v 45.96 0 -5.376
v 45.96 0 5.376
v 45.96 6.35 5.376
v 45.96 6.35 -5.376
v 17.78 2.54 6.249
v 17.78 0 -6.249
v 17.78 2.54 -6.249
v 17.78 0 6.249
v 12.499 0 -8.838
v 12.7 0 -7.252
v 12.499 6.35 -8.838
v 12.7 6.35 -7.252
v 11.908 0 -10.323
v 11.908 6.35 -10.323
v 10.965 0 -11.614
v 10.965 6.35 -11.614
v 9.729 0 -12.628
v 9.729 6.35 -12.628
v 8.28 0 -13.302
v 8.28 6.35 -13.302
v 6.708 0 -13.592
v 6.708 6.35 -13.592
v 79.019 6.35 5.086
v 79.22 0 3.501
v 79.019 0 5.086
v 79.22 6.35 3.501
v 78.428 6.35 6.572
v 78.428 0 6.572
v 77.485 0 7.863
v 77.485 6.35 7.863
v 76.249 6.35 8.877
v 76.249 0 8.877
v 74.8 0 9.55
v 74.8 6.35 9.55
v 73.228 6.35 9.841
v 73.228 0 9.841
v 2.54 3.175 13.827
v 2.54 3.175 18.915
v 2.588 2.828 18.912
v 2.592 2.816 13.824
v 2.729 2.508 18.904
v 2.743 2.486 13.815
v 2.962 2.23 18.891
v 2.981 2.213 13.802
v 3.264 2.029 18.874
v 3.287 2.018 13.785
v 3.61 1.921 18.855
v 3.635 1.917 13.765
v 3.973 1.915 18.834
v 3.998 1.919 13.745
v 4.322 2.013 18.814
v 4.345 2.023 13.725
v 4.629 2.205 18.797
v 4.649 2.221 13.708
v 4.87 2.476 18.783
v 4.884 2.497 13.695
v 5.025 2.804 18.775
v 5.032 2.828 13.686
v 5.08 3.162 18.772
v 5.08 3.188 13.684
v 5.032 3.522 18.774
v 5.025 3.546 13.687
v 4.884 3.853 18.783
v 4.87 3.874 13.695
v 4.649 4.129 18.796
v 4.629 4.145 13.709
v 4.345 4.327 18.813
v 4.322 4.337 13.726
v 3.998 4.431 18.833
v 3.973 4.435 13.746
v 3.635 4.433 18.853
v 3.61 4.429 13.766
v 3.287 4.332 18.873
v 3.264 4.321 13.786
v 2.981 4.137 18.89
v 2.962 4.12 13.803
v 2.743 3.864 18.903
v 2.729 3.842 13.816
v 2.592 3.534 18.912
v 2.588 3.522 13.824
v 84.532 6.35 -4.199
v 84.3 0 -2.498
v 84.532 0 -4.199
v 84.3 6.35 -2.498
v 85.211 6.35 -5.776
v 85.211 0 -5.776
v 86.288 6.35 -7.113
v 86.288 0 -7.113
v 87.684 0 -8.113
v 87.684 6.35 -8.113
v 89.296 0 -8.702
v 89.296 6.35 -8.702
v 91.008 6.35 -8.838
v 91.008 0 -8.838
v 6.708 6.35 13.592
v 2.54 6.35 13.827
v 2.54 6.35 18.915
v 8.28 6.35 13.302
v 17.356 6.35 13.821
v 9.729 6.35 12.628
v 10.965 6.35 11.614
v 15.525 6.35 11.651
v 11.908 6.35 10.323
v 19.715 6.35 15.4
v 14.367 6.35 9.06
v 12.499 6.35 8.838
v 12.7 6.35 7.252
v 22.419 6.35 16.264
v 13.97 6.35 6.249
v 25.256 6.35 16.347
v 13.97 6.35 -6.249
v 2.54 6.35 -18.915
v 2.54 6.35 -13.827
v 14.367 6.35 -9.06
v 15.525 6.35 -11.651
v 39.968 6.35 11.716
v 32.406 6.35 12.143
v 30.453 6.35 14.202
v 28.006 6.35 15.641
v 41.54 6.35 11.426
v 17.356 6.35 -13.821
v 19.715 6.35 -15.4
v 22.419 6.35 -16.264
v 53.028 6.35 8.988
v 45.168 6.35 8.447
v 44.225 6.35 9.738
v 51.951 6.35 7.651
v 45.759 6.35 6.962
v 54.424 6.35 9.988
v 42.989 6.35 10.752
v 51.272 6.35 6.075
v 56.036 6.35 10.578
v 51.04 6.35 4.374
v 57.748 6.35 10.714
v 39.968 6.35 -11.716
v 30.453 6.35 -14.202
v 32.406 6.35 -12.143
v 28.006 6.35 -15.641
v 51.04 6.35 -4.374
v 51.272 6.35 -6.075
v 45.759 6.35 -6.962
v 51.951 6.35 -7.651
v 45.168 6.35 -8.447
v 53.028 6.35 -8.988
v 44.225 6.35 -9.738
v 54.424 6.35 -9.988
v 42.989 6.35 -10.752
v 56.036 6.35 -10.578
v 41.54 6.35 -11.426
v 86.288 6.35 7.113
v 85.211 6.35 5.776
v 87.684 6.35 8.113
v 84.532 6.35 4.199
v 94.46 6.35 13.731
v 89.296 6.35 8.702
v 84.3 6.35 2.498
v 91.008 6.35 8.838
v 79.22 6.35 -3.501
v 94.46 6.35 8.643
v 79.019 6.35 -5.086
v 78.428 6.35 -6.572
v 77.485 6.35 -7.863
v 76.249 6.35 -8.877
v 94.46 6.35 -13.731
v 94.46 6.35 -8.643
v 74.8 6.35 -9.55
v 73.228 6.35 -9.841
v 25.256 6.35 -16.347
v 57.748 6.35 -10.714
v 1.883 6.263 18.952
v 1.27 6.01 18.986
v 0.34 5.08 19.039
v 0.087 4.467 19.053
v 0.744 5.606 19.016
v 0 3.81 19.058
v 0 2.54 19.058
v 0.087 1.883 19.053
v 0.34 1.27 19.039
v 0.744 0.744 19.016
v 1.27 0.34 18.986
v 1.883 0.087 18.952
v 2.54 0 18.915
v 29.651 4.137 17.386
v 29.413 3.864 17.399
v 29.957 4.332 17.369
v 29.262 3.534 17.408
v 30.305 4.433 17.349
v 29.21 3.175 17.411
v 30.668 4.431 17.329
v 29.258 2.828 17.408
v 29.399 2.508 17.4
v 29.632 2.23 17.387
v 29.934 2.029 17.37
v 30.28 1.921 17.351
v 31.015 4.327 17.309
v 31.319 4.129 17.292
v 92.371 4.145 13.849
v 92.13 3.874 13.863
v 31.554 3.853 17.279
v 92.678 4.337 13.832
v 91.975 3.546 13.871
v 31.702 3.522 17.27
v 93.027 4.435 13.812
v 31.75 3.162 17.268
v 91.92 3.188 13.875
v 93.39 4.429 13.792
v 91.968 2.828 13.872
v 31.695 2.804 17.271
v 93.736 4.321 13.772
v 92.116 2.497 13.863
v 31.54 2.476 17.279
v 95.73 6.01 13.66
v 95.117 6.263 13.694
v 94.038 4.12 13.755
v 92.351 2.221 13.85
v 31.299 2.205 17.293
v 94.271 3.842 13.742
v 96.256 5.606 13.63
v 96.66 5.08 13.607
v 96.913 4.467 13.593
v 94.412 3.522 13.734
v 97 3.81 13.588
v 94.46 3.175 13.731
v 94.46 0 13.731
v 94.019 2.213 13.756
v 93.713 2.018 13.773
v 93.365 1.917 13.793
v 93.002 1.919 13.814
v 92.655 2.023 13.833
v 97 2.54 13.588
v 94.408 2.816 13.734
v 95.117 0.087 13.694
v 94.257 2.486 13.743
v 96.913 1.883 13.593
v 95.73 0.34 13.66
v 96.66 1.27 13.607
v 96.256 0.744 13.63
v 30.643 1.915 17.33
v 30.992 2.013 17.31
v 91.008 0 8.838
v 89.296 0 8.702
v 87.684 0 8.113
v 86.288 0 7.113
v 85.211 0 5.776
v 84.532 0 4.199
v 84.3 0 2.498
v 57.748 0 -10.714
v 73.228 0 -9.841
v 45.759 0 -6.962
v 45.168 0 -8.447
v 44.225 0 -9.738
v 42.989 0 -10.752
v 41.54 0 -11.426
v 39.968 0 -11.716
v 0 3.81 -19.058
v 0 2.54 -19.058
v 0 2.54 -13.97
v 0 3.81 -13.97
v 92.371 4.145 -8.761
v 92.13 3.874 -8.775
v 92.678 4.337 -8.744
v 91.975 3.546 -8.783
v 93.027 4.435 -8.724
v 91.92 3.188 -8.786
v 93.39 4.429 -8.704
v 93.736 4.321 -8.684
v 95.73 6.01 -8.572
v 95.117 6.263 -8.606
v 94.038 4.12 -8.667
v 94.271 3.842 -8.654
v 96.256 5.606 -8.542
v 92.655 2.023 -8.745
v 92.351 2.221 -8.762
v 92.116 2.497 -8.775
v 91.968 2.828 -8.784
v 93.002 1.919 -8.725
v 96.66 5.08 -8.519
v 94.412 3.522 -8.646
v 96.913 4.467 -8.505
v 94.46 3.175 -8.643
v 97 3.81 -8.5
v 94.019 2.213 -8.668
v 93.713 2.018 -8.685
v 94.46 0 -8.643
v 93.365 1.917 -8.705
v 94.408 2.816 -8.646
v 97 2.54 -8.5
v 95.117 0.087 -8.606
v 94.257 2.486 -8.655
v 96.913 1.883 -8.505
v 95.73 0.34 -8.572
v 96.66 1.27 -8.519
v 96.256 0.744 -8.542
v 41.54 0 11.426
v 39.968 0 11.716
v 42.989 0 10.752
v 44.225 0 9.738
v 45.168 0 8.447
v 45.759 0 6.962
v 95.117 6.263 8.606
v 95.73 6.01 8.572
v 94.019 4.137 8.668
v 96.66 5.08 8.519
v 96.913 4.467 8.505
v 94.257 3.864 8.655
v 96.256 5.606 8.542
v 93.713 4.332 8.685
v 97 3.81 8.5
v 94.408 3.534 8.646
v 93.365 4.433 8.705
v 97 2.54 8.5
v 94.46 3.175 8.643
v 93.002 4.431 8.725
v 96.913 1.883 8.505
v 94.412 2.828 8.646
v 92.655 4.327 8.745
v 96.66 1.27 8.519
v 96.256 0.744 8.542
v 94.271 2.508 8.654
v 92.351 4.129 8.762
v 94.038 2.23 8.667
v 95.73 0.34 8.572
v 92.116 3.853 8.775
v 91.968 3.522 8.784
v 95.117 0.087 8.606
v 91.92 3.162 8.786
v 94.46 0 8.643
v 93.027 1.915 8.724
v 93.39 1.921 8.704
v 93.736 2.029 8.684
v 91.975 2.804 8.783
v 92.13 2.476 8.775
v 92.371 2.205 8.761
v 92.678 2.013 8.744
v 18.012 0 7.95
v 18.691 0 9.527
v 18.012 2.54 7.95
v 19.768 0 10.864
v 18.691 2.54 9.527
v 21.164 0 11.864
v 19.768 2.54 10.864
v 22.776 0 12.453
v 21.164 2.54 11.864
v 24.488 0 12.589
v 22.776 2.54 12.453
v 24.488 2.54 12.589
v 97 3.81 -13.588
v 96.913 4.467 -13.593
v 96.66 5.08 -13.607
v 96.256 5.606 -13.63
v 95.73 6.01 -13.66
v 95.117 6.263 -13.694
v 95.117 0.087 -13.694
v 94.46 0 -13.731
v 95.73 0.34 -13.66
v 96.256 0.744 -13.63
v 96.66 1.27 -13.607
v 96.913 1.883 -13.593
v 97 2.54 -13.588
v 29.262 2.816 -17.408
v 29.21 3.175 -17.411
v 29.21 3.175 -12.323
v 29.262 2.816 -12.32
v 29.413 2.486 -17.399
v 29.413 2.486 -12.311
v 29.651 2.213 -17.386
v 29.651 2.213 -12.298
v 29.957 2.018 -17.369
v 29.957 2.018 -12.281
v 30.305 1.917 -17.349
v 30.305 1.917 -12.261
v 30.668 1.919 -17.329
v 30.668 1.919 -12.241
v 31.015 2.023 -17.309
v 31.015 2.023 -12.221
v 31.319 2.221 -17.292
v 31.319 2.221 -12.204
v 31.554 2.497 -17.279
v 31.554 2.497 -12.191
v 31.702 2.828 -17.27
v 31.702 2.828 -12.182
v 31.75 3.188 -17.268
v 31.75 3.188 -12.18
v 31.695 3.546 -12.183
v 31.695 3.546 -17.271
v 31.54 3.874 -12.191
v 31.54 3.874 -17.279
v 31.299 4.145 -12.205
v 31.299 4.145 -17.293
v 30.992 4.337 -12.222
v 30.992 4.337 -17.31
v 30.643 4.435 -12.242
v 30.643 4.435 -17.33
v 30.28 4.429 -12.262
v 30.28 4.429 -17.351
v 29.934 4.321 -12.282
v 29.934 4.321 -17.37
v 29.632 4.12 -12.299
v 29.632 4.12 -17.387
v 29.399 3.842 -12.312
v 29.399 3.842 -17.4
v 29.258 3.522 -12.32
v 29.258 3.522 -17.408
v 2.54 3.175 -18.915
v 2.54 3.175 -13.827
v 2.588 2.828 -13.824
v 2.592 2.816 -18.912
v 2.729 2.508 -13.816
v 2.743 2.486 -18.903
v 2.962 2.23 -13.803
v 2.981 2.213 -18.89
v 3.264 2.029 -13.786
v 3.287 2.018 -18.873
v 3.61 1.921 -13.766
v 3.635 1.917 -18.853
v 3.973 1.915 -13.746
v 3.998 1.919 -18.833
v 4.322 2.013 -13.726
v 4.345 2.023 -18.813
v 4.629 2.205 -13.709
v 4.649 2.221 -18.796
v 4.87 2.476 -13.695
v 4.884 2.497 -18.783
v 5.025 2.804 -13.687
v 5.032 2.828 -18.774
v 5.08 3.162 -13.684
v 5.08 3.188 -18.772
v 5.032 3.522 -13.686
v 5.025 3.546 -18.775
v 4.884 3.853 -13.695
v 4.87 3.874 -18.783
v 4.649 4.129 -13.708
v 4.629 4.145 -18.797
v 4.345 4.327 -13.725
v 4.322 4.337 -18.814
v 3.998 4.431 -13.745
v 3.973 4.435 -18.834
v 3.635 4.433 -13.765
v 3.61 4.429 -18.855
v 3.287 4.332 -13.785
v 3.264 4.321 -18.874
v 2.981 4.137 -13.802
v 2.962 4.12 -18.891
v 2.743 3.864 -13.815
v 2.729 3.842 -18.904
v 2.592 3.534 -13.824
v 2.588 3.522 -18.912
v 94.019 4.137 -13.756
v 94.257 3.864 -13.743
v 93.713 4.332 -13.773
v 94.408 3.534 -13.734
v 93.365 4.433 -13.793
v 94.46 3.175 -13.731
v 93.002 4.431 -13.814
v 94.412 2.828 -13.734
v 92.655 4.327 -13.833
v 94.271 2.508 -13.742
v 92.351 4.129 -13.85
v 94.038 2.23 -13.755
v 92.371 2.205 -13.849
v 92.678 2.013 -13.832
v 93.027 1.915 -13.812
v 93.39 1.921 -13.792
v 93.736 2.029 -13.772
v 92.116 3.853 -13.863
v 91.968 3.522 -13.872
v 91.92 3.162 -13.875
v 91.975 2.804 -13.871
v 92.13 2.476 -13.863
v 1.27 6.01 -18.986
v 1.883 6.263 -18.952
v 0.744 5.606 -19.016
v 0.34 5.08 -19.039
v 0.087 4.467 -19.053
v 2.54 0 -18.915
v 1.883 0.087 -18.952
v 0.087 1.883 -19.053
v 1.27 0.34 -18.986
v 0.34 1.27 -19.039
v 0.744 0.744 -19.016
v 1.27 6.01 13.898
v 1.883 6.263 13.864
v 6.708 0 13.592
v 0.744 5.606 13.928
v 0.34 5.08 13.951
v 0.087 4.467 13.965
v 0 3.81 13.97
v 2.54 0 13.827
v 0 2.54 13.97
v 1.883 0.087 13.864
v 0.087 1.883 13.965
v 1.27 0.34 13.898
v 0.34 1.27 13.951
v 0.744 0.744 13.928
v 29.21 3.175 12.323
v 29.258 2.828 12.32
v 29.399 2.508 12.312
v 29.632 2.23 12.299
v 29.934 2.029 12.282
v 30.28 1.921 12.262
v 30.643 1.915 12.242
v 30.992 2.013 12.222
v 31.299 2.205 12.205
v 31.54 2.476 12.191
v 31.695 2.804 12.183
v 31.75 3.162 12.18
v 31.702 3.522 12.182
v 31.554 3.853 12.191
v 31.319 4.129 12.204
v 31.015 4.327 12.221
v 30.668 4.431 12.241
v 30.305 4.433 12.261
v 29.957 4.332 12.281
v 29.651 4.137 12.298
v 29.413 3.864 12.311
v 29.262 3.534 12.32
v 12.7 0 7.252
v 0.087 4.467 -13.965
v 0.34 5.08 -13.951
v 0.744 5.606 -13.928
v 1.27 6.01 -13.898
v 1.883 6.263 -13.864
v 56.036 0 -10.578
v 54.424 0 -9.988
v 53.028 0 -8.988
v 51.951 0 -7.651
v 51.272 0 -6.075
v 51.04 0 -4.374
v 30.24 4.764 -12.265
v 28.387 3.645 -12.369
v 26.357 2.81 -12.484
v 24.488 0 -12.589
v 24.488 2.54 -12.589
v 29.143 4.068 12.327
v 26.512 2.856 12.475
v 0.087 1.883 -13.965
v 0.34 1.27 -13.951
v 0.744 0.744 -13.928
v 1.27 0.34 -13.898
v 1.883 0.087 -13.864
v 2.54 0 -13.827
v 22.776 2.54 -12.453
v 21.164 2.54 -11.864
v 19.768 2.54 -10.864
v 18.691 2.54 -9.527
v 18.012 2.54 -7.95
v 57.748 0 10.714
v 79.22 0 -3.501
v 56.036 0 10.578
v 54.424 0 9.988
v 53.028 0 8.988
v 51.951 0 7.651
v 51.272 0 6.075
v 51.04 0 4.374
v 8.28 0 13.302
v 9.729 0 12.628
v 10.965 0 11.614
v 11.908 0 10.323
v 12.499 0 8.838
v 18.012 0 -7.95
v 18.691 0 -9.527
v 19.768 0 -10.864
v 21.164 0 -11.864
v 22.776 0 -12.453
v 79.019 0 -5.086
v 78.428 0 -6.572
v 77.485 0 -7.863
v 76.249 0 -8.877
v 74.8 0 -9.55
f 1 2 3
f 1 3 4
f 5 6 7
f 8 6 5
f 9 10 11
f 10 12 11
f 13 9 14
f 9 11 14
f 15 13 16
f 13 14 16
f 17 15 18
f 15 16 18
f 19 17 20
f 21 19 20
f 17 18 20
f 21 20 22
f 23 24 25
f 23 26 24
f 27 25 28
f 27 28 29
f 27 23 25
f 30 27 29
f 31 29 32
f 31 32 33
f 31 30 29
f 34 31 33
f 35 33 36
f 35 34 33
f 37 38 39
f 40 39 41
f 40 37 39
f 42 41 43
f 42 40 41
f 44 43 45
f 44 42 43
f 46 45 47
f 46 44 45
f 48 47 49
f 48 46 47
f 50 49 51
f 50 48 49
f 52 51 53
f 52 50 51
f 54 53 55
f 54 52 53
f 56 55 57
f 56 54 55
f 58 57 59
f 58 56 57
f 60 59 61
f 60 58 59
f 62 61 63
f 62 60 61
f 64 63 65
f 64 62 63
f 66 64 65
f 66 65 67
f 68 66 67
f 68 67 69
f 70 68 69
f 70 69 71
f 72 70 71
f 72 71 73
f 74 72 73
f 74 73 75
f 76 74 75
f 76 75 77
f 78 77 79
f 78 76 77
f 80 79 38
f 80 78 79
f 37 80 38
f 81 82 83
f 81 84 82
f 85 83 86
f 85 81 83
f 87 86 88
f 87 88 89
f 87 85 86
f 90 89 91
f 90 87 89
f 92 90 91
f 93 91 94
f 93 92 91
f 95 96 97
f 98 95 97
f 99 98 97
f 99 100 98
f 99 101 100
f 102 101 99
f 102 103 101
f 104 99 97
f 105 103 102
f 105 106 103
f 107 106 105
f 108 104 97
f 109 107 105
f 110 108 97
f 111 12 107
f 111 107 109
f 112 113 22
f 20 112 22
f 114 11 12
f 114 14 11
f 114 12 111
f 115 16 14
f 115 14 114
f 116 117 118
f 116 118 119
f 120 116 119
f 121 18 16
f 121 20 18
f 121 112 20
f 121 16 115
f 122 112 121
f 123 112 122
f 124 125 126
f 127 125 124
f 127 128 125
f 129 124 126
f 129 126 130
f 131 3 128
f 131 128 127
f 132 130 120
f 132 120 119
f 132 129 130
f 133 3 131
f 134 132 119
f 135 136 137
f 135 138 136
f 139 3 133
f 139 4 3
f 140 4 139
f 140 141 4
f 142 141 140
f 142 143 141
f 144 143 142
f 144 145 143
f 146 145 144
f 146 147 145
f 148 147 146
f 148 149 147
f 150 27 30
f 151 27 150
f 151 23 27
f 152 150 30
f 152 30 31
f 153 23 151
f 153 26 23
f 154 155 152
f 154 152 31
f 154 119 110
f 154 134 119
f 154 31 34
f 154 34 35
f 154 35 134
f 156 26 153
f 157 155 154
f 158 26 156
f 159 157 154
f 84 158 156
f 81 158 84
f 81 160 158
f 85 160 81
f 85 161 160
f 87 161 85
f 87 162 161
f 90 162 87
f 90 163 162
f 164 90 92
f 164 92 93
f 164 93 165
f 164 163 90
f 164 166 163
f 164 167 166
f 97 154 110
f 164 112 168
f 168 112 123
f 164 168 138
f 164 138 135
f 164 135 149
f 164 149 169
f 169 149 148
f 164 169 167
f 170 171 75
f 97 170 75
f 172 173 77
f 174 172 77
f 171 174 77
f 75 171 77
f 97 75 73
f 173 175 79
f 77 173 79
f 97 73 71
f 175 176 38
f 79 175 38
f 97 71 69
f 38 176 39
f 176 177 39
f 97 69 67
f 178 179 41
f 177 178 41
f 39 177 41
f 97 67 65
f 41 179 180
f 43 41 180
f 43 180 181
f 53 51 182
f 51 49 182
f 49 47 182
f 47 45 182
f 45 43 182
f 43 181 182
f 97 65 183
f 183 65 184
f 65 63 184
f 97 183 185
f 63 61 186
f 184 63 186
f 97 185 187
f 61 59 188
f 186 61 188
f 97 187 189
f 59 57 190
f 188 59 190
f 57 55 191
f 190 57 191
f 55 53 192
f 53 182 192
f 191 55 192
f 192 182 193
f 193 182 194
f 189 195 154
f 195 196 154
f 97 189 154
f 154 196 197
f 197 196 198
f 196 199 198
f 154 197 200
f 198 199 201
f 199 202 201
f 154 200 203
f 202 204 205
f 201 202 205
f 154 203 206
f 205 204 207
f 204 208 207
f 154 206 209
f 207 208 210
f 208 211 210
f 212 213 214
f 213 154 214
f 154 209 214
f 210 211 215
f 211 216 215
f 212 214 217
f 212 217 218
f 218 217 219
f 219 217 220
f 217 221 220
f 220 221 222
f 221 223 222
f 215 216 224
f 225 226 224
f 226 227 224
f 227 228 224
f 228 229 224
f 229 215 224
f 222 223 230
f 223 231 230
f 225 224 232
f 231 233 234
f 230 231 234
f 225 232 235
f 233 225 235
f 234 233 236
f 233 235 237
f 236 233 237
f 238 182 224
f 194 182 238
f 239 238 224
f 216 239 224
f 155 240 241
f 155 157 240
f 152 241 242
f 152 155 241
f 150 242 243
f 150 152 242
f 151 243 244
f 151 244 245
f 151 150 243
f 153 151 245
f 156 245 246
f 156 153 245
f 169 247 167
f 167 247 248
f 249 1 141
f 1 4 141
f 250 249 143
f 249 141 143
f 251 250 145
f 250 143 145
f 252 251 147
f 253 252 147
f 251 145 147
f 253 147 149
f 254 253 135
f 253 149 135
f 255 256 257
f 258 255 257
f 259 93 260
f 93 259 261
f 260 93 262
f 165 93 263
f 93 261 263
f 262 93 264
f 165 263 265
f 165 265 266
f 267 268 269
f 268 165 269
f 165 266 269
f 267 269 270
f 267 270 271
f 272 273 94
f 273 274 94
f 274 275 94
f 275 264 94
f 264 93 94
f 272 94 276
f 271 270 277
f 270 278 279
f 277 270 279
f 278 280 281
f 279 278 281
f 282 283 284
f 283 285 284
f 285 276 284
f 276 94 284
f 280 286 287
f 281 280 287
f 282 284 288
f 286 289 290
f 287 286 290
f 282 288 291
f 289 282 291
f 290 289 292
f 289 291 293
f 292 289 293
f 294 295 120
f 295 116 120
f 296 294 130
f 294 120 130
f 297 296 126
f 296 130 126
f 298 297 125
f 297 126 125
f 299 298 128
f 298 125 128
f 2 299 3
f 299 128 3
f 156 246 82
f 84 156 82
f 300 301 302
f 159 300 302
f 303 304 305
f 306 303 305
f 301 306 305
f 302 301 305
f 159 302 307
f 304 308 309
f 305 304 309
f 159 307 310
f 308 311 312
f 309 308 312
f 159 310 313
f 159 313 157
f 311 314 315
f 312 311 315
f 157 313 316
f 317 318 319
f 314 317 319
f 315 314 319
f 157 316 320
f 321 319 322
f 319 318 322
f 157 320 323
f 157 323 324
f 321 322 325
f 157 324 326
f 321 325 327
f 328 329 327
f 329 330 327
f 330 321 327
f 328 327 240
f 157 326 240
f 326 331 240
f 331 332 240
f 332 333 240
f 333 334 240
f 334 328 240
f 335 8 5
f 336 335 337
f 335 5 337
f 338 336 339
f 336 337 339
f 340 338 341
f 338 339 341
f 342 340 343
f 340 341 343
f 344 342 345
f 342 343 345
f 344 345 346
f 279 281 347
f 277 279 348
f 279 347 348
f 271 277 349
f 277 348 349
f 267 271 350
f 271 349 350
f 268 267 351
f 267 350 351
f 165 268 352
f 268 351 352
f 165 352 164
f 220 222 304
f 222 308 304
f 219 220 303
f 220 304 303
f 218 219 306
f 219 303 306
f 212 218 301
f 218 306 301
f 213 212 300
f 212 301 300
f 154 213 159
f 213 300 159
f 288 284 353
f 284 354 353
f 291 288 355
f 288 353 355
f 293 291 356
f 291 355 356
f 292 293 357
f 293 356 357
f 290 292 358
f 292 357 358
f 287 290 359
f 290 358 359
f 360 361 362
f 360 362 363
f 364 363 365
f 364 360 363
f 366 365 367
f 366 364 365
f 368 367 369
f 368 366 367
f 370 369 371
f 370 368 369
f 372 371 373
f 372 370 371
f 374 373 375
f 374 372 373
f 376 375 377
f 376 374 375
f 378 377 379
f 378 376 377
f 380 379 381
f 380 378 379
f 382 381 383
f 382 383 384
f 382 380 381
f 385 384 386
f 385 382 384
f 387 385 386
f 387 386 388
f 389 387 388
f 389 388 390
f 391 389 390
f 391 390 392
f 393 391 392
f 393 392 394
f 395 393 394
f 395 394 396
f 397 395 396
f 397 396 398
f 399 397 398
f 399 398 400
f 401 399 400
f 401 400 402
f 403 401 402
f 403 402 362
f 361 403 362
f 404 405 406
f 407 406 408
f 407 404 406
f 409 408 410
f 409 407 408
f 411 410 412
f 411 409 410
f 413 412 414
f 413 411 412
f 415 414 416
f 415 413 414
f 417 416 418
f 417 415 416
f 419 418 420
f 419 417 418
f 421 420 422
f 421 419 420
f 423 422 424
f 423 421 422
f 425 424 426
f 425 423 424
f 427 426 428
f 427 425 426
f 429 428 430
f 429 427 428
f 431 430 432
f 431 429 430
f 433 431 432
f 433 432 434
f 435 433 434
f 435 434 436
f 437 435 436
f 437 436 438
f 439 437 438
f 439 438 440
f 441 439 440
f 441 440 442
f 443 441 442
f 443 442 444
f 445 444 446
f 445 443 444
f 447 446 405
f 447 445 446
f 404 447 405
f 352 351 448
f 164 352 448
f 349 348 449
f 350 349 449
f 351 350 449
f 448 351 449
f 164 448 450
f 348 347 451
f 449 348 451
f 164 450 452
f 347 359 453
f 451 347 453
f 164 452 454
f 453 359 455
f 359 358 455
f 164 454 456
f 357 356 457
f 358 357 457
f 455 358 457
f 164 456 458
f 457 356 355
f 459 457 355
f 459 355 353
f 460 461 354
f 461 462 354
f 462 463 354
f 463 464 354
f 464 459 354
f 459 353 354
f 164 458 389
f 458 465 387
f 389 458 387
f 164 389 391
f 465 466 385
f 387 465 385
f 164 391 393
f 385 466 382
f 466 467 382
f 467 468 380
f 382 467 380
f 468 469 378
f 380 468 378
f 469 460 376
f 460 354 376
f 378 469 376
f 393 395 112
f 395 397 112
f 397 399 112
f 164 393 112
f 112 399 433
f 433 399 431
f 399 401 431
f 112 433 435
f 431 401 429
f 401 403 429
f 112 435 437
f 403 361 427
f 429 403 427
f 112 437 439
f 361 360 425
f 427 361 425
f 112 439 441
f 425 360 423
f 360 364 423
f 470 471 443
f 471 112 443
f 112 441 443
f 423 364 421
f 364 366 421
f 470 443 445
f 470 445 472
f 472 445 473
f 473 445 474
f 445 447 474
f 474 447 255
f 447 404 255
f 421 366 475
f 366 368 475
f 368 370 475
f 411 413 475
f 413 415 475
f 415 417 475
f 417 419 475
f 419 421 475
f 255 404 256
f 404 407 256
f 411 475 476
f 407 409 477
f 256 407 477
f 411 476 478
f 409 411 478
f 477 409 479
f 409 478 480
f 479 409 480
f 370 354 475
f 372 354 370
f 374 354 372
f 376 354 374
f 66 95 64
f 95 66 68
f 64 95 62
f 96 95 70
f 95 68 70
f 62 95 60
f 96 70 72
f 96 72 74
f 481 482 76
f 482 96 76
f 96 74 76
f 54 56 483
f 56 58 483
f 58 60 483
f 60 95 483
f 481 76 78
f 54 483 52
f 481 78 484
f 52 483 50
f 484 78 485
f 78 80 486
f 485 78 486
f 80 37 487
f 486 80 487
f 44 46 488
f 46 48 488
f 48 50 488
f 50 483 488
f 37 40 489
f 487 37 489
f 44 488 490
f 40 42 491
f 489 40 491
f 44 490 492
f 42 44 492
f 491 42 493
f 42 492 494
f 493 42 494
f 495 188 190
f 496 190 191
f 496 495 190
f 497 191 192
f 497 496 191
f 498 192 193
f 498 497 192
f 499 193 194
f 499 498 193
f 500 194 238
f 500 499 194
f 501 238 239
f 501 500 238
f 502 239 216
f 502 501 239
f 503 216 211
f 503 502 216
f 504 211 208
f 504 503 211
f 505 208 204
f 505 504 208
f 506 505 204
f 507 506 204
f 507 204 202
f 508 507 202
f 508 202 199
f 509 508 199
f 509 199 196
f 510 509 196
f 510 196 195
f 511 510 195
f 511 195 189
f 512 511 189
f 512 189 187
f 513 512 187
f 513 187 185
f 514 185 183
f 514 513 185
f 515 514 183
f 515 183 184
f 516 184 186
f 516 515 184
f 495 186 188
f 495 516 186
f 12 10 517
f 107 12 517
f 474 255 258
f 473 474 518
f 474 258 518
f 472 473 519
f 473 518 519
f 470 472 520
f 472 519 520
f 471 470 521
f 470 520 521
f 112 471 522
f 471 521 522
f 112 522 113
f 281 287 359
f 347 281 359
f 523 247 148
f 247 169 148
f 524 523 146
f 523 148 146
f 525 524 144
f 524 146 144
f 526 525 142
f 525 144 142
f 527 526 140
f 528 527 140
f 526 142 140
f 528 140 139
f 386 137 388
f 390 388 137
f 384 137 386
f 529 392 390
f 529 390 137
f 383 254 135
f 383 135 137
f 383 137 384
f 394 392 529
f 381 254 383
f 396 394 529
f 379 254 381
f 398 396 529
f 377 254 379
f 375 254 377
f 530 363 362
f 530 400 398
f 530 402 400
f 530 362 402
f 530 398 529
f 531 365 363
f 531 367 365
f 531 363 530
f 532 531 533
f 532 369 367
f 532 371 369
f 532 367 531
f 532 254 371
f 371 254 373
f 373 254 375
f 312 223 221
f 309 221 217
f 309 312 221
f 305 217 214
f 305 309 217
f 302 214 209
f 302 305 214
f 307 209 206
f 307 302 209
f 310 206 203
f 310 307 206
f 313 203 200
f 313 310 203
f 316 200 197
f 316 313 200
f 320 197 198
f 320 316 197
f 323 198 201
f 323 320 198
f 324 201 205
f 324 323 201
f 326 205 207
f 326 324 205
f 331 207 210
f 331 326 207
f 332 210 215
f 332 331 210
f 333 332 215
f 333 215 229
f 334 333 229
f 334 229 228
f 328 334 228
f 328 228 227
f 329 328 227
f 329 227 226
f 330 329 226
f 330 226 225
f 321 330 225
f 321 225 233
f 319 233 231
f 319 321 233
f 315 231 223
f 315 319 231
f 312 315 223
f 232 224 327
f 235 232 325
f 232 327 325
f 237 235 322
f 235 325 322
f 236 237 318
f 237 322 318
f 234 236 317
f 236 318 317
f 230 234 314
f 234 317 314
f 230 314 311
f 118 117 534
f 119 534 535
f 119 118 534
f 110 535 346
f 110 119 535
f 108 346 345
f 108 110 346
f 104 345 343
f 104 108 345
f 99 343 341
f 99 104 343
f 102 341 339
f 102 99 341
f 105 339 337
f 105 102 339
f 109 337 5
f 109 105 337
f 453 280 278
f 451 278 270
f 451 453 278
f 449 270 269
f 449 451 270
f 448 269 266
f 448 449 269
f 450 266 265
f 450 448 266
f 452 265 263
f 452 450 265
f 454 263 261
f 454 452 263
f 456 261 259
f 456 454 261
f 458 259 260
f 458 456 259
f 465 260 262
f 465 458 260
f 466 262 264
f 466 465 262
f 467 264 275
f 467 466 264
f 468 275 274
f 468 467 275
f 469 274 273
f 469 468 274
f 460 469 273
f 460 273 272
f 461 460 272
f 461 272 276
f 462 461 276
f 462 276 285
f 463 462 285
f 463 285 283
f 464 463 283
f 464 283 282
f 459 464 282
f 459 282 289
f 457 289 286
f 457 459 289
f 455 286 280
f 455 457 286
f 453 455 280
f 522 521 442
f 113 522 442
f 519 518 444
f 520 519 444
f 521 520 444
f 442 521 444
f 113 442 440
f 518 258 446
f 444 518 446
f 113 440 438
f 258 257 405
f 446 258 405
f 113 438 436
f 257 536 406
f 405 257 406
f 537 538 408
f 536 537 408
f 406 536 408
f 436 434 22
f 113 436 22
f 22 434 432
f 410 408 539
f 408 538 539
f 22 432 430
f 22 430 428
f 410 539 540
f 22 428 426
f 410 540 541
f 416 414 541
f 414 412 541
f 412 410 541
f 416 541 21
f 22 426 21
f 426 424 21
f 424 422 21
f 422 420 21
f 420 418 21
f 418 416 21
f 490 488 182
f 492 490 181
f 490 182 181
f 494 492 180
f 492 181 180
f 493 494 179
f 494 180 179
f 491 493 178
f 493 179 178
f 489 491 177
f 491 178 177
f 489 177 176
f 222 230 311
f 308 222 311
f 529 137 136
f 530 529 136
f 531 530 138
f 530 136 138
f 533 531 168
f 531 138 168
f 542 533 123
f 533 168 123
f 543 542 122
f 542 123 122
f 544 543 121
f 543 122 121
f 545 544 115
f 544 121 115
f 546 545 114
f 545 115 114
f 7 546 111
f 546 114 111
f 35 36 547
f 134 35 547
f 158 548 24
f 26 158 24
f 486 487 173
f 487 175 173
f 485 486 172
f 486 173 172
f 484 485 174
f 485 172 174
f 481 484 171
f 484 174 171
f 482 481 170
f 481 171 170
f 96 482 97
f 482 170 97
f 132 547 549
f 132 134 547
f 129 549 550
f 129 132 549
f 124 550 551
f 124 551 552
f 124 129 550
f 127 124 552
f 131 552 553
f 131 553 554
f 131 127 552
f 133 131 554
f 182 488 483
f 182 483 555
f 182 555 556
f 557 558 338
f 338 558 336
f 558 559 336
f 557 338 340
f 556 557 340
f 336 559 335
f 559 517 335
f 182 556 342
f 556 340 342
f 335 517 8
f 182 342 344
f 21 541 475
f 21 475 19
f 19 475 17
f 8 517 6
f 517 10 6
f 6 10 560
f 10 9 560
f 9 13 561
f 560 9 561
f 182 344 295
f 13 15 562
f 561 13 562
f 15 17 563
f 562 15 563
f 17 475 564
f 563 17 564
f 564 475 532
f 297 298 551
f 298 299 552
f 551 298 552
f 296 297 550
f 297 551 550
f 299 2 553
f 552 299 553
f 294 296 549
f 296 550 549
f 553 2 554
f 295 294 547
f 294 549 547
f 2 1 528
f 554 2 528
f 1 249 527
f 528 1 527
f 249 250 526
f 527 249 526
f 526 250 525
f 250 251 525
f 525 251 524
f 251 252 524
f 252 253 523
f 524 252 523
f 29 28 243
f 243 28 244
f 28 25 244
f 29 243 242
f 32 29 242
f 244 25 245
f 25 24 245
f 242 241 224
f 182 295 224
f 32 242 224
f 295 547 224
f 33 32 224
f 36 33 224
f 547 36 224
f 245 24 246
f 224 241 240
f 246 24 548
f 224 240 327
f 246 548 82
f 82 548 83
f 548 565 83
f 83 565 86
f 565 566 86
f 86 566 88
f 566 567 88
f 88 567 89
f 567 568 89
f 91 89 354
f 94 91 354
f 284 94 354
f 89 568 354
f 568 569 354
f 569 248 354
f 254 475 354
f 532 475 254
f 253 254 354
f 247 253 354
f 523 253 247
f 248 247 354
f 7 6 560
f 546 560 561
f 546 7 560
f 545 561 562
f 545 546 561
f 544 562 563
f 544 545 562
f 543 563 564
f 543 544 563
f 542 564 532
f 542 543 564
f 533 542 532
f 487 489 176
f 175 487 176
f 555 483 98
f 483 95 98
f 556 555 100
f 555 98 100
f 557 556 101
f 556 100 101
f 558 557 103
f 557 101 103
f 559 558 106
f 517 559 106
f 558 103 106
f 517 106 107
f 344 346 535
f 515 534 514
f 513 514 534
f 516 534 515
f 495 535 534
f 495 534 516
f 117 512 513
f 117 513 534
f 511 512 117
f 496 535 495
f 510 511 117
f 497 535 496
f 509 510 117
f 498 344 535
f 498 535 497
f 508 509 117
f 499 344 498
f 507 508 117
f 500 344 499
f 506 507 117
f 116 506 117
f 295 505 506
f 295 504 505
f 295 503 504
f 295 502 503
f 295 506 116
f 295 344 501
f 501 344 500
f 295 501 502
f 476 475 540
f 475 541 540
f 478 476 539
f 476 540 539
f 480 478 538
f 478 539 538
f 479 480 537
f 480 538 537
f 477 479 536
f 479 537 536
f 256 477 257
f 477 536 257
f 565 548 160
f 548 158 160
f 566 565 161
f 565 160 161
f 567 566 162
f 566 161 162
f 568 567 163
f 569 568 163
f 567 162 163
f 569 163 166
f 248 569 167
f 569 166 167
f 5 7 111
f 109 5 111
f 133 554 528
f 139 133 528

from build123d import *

# Parameters (mm, degrees)
ARM_DEPTH               = 6.35
CUT_EXTRUDE1_DEPTH      = 100.058228154
CUT_EXTRUDE1_DEPTH_BACK = 100.058228154
SKETCH2_R               = 1.27
CUT_EXTRUDE2_DEPTH      = 100.058228154
CUT_EXTRUDE2_DEPTH_BACK = 100.058228154
SKETCH3_R               = 1.27
FILLET2_R               = 6.35
FILLET3_R               = 2.54
CHAMFER1_SIZE           = 3.81


with BuildPart() as part:
    # Sketch1 → Arm (new body)
    with BuildSketch(Plane(origin=(0, 0, 0), x_dir=(1, 0, 0), z_dir=(0, 1, 0))):
        Polygon((0, -19.058070864), (97, -13.588070864), (97, -8.5), (84.3, -9.216175258), (84.3, 9.216175258), (97, 8.5), (97, 13.588070864), (0, 19.058070864), (0, 13.97), (12.7, 13.253824742), (12.7, -13.253824742), (0, -13.97), align=None)
        Polygon((79.22, -9.502645361), (51.04, -11.091764948), (51.04, 11.091764948), (79.22, 9.502645361), align=None, mode=Mode.SUBTRACT)
        Polygon((17.78, 12.967354639), (17.78, -12.967354639), (45.96, -11.378235052), (45.96, 11.378235052), align=None, mode=Mode.SUBTRACT)
    extrude(amount=ARM_DEPTH)

    # Sketch2 → Cut-Extrude1 (cut, two sides: drawn at the far end of the back side and taken through both)
    with BuildSketch(Plane.XY.offset(-CUT_EXTRUDE1_DEPTH_BACK)):
        with Locations(Location((30.48, 3.175, 0), (0, 0, 180))):
            Circle(SKETCH2_R)
    extrude(amount=CUT_EXTRUDE1_DEPTH + CUT_EXTRUDE1_DEPTH_BACK, mode=Mode.SUBTRACT)

    # Sketch3 → Cut-Extrude2 (cut, two sides: drawn at the far end of the back side and taken through both)
    with BuildSketch(Plane.XY.offset(-CUT_EXTRUDE2_DEPTH_BACK)):
        with Locations((93.19, 3.175)):
            Circle(SKETCH3_R)
        with Locations(Location((3.81, 3.175, 0), (0, 0, 180))):
            Circle(SKETCH3_R)
    extrude(amount=CUT_EXTRUDE2_DEPTH + CUT_EXTRUDE2_DEPTH_BACK, mode=Mode.SUBTRACT)

    # Fillet2
    fillet2_edges = [part.edges().sort_by_distance(p)[0] for p in [
        (12.7, 3.175, 13.253824742),
        (12.7, 3.175, -13.253824742),
        (84.3, 3.175, -9.216175258),
        (84.3, 3.175, 9.216175258),
        (45.96, 3.175, -11.378235052),
        (17.78, 3.175, -12.967354639),
        (17.78, 3.175, 12.967354639),
        (45.96, 3.175, 11.378235052),
        (79.22, 3.175, 9.502645361),
        (79.22, 3.175, -9.502645361),
        (51.04, 3.175, -11.091764948),
        (51.04, 3.175, 11.091764948),
    ]]
    fillet(fillet2_edges, radius=FILLET2_R)

    # Fillet3
    fillet3_edges = [part.edges().sort_by_distance(p)[0] for p in [
        (97, 6.35, 11.044035432),
        (0, 0, -16.514035432),
        (97, 0, -11.044035432),
        (97, 0, 11.044035432),
        (0, 0, 16.514035432),
        (97, 6.35, -11.044035432),
        (0, 6.35, -16.514035432),
        (0, 6.35, 16.514035432),
    ]]
    fillet(fillet3_edges, radius=FILLET3_R)

    # Chamfer1
    # the kernel refuses this chamfer: 3.81 mm, written as the material it takes off along each edge
    with BuildSketch(Plane(origin=(17.78, 6.35, -6.24917843), x_dir=(0.027495876610586382, -0.9996219169112968, 0), z_dir=(0, 0, 1))) as chamfer1_piece_1:
        Polygon((CHAMFER1_SIZE * 0.999621916911, -CHAMFER1_SIZE * 0.0274958766106), (-CHAMFER1_SIZE * 0.0274958766106, -CHAMFER1_SIZE * 0.999621916911), (0, 0), align=None)
    extrude(amount=12.49835686, mode=Mode.SUBTRACT)
    with BuildSketch(Plane(origin=(24.13, 6.35, 6.24917843), x_dir=(0.9995733988743083, 0, -0.02920651062456478), z_dir=(-0.02920651062456478, 0, -0.9995733988743083))) as chamfer1_piece_2:
        Polygon((6.35, CHAMFER1_SIZE), (6.35 + CHAMFER1_SIZE, 0), (6.35, 0), align=None)
    revolve(axis=Axis((24.13, 6.35, 6.24917843), (0, -1, 0)), revolution_arc=181.673647793, mode=Mode.SUBTRACT)
    with BuildSketch(Plane(origin=(24.13, 6.35, -6.24917843), x_dir=(0.9995733988743084, 0, 0.029206510624563663), z_dir=(-0.029206510624563663, 0, 0.9995733988743084))) as chamfer1_piece_3:
        Polygon((6.35, -CHAMFER1_SIZE), (6.35 + CHAMFER1_SIZE, 0), (6.35, 0), align=None)
    revolve(axis=Axis((24.13, 6.35, -6.24917843), (0, 1, 0)), revolution_arc=181.673647793, mode=Mode.SUBTRACT)


solid = part.part
